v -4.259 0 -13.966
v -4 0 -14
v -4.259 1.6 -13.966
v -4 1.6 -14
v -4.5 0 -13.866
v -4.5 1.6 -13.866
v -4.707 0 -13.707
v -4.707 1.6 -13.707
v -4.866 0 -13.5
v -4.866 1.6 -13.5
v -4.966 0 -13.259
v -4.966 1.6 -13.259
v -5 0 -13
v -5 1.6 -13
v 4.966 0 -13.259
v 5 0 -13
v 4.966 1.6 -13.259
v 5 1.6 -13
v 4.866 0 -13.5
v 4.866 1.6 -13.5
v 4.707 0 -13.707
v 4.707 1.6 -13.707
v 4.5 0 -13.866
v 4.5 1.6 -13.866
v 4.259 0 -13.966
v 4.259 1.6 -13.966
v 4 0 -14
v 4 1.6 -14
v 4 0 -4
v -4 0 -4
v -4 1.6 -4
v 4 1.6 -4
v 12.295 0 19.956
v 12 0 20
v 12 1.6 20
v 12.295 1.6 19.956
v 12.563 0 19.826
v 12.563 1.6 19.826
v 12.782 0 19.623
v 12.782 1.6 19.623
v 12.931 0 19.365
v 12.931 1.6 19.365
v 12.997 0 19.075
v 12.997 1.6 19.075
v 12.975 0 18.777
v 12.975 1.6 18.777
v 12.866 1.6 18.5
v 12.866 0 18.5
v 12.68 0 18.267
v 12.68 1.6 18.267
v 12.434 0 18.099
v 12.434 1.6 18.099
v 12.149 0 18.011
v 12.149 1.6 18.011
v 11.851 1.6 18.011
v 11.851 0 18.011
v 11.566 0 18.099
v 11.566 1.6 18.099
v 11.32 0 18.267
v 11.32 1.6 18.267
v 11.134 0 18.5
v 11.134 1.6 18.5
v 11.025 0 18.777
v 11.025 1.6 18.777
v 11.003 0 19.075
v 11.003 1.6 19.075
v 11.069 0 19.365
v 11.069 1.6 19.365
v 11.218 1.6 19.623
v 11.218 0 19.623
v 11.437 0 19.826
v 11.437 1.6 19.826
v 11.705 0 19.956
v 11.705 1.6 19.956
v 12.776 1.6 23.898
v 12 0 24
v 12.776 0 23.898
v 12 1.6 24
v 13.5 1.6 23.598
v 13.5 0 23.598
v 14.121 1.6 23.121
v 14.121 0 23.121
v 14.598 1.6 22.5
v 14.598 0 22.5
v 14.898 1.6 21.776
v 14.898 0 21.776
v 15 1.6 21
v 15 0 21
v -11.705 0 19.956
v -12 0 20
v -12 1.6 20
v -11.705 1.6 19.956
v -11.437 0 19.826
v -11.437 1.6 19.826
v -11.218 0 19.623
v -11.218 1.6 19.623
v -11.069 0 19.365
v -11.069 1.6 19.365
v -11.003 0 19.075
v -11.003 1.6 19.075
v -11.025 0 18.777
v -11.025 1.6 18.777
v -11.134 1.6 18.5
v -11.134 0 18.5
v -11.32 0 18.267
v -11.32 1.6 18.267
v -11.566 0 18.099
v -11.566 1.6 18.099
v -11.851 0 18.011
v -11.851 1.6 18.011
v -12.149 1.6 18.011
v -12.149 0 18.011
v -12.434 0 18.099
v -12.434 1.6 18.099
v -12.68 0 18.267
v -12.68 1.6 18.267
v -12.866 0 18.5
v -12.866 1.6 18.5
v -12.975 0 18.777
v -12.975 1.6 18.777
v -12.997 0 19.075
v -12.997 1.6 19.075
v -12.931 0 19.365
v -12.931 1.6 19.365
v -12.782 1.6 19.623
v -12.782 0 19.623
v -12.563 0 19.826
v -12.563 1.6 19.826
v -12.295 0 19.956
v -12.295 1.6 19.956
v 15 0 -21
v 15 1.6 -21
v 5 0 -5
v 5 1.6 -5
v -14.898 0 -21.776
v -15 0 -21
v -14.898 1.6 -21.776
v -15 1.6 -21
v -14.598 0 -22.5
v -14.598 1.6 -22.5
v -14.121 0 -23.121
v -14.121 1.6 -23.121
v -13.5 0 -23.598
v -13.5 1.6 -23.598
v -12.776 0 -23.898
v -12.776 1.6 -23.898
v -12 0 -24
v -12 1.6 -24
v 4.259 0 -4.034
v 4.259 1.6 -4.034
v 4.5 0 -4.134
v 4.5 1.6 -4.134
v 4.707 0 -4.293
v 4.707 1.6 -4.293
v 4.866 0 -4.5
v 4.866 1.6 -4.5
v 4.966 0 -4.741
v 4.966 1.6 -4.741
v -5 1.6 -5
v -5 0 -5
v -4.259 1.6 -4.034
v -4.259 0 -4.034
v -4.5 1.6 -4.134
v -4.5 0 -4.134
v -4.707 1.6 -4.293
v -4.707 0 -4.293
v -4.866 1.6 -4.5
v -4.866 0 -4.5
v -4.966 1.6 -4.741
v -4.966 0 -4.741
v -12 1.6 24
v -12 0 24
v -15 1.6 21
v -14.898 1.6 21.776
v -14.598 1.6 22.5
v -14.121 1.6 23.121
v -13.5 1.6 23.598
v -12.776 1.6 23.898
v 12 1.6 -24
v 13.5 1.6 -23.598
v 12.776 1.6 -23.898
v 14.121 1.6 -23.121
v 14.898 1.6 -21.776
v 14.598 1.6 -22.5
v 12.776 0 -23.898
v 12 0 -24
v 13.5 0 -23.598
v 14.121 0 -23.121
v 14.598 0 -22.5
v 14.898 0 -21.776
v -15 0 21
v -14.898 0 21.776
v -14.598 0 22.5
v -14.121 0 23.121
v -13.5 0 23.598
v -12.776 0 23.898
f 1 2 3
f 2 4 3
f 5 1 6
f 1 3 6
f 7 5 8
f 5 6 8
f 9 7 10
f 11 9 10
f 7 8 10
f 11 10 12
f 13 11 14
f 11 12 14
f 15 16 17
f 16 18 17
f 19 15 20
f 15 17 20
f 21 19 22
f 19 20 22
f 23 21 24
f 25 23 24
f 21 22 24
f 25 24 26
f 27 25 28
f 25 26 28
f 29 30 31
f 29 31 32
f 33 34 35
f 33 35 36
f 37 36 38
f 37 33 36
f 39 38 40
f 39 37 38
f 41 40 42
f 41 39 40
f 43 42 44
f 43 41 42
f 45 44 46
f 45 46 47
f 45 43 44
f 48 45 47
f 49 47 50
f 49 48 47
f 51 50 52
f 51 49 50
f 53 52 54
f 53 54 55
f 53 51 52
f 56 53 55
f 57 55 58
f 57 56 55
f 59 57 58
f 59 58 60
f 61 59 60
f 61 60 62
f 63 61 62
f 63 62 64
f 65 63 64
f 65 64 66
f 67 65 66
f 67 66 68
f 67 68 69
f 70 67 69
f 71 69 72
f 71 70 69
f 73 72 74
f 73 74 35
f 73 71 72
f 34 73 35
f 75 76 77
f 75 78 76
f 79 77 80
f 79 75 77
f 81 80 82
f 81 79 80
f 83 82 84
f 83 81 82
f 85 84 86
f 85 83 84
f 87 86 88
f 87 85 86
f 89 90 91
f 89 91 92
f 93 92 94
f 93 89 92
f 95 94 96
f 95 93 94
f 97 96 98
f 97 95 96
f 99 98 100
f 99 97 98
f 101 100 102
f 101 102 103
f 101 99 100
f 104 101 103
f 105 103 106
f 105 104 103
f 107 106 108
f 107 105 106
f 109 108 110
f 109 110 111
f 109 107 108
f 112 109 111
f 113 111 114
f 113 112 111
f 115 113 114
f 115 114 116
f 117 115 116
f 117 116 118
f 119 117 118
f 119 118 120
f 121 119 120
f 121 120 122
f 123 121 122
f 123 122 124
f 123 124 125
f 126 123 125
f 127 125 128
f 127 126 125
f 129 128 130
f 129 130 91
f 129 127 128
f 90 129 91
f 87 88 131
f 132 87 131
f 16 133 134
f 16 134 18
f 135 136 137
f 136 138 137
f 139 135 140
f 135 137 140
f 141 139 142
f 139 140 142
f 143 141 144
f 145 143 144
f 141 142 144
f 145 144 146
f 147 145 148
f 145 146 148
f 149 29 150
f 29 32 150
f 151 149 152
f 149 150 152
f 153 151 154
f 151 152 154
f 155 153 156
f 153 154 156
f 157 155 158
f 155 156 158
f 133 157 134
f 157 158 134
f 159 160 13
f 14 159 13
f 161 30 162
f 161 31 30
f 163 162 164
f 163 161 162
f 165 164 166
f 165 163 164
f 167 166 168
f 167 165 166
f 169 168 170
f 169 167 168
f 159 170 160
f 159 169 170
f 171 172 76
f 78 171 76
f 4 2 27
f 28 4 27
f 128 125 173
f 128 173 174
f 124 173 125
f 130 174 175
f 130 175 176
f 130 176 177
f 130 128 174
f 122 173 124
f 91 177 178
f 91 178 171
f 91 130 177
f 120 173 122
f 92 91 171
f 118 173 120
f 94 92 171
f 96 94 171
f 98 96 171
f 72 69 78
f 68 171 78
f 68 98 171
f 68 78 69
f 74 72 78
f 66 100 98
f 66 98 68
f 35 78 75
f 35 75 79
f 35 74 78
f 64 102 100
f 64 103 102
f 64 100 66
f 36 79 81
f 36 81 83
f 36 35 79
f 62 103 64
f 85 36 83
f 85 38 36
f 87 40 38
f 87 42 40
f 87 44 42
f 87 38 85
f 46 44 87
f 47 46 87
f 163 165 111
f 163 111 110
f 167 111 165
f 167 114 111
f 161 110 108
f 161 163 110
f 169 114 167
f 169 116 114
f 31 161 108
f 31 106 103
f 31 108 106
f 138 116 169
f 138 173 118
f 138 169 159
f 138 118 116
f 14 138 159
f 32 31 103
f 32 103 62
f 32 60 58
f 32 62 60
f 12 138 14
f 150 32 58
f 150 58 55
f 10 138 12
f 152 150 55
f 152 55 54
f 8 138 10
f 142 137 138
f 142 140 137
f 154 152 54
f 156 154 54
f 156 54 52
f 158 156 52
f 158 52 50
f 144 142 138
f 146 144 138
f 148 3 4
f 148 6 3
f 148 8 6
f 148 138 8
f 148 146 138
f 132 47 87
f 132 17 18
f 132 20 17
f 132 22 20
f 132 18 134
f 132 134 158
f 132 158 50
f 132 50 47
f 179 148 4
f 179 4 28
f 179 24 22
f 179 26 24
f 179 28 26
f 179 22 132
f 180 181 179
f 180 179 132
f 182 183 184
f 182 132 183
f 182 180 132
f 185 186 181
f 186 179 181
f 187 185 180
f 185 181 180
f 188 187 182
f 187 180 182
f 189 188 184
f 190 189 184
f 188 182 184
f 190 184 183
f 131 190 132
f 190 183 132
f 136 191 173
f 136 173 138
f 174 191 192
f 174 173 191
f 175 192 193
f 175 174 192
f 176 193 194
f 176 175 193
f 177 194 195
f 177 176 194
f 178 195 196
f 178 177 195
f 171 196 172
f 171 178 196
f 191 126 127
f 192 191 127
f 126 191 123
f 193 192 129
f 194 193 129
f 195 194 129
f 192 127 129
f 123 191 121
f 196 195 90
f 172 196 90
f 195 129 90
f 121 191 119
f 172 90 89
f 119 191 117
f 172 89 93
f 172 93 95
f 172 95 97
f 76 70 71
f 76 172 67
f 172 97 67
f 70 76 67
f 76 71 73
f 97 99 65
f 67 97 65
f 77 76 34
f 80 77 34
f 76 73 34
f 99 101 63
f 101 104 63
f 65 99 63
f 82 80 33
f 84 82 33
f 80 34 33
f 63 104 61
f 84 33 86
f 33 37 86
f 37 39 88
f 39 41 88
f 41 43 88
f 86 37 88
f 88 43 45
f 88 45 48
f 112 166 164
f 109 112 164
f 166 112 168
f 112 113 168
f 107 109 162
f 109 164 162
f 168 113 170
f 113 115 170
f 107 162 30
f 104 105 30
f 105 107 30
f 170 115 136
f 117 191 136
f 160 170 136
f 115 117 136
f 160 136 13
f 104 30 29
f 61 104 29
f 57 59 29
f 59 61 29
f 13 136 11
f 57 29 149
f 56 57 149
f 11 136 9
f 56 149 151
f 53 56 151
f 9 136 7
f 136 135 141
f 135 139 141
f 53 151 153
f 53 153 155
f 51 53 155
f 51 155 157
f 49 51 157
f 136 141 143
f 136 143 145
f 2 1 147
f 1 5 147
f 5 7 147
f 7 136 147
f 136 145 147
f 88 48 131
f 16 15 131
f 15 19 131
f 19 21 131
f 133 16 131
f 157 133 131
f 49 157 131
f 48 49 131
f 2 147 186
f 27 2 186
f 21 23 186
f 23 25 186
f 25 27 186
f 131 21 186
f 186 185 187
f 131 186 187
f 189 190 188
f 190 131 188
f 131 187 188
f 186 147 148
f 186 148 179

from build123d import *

# Parameters (mm, degrees)
SKETCH_1_W      = 30
SKETCH_1_H      = 48
SKETCH_1_R      = 1
SKETCH_1_W_2    = 10
SKETCH_1_H_2    = 10
EXTRUDE_1_DEPTH = 1.6
FILLET_1_R      = 3
FILLET_2_R      = 1


with BuildPart() as part:
    # 草图1 → 凸台-拉伸1 (new body)
    with BuildSketch(Plane(origin=(0, 0, 0), x_dir=(1, 0, 0), z_dir=(0, 1, 0))):
        Rectangle(SKETCH_1_W, SKETCH_1_H)
        with Locations(Location((-12, -19, 0), (0, 0, 270))):
            Circle(SKETCH_1_R, mode=Mode.SUBTRACT)
        with Locations(Location((12, -19, 0), (0, 0, 270))):
            Circle(SKETCH_1_R, mode=Mode.SUBTRACT)
        with Locations((0, 9)):
            Rectangle(SKETCH_1_W_2, SKETCH_1_H_2, mode=Mode.SUBTRACT)
    extrude(amount=EXTRUDE_1_DEPTH)

    # 圆角1
    fillet_1_edges = [part.edges().sort_by_distance(p)[0] for p in [
        (15, 0.8, 24),
        (-15, 0.8, 24),
        (-15, 0.8, -24),
        (15, 0.8, -24),
    ]]
    fillet(fillet_1_edges, radius=FILLET_1_R)

    # 圆角2
    fillet_2_edges = [part.edges().sort_by_distance(p)[0] for p in [
        (5, 0.8, -4),
        (5, 0.8, -14),
        (-5, 0.8, -14),
        (-5, 0.8, -4),
    ]]
    fillet(fillet_2_edges, radius=FILLET_2_R)


solid = part.part
